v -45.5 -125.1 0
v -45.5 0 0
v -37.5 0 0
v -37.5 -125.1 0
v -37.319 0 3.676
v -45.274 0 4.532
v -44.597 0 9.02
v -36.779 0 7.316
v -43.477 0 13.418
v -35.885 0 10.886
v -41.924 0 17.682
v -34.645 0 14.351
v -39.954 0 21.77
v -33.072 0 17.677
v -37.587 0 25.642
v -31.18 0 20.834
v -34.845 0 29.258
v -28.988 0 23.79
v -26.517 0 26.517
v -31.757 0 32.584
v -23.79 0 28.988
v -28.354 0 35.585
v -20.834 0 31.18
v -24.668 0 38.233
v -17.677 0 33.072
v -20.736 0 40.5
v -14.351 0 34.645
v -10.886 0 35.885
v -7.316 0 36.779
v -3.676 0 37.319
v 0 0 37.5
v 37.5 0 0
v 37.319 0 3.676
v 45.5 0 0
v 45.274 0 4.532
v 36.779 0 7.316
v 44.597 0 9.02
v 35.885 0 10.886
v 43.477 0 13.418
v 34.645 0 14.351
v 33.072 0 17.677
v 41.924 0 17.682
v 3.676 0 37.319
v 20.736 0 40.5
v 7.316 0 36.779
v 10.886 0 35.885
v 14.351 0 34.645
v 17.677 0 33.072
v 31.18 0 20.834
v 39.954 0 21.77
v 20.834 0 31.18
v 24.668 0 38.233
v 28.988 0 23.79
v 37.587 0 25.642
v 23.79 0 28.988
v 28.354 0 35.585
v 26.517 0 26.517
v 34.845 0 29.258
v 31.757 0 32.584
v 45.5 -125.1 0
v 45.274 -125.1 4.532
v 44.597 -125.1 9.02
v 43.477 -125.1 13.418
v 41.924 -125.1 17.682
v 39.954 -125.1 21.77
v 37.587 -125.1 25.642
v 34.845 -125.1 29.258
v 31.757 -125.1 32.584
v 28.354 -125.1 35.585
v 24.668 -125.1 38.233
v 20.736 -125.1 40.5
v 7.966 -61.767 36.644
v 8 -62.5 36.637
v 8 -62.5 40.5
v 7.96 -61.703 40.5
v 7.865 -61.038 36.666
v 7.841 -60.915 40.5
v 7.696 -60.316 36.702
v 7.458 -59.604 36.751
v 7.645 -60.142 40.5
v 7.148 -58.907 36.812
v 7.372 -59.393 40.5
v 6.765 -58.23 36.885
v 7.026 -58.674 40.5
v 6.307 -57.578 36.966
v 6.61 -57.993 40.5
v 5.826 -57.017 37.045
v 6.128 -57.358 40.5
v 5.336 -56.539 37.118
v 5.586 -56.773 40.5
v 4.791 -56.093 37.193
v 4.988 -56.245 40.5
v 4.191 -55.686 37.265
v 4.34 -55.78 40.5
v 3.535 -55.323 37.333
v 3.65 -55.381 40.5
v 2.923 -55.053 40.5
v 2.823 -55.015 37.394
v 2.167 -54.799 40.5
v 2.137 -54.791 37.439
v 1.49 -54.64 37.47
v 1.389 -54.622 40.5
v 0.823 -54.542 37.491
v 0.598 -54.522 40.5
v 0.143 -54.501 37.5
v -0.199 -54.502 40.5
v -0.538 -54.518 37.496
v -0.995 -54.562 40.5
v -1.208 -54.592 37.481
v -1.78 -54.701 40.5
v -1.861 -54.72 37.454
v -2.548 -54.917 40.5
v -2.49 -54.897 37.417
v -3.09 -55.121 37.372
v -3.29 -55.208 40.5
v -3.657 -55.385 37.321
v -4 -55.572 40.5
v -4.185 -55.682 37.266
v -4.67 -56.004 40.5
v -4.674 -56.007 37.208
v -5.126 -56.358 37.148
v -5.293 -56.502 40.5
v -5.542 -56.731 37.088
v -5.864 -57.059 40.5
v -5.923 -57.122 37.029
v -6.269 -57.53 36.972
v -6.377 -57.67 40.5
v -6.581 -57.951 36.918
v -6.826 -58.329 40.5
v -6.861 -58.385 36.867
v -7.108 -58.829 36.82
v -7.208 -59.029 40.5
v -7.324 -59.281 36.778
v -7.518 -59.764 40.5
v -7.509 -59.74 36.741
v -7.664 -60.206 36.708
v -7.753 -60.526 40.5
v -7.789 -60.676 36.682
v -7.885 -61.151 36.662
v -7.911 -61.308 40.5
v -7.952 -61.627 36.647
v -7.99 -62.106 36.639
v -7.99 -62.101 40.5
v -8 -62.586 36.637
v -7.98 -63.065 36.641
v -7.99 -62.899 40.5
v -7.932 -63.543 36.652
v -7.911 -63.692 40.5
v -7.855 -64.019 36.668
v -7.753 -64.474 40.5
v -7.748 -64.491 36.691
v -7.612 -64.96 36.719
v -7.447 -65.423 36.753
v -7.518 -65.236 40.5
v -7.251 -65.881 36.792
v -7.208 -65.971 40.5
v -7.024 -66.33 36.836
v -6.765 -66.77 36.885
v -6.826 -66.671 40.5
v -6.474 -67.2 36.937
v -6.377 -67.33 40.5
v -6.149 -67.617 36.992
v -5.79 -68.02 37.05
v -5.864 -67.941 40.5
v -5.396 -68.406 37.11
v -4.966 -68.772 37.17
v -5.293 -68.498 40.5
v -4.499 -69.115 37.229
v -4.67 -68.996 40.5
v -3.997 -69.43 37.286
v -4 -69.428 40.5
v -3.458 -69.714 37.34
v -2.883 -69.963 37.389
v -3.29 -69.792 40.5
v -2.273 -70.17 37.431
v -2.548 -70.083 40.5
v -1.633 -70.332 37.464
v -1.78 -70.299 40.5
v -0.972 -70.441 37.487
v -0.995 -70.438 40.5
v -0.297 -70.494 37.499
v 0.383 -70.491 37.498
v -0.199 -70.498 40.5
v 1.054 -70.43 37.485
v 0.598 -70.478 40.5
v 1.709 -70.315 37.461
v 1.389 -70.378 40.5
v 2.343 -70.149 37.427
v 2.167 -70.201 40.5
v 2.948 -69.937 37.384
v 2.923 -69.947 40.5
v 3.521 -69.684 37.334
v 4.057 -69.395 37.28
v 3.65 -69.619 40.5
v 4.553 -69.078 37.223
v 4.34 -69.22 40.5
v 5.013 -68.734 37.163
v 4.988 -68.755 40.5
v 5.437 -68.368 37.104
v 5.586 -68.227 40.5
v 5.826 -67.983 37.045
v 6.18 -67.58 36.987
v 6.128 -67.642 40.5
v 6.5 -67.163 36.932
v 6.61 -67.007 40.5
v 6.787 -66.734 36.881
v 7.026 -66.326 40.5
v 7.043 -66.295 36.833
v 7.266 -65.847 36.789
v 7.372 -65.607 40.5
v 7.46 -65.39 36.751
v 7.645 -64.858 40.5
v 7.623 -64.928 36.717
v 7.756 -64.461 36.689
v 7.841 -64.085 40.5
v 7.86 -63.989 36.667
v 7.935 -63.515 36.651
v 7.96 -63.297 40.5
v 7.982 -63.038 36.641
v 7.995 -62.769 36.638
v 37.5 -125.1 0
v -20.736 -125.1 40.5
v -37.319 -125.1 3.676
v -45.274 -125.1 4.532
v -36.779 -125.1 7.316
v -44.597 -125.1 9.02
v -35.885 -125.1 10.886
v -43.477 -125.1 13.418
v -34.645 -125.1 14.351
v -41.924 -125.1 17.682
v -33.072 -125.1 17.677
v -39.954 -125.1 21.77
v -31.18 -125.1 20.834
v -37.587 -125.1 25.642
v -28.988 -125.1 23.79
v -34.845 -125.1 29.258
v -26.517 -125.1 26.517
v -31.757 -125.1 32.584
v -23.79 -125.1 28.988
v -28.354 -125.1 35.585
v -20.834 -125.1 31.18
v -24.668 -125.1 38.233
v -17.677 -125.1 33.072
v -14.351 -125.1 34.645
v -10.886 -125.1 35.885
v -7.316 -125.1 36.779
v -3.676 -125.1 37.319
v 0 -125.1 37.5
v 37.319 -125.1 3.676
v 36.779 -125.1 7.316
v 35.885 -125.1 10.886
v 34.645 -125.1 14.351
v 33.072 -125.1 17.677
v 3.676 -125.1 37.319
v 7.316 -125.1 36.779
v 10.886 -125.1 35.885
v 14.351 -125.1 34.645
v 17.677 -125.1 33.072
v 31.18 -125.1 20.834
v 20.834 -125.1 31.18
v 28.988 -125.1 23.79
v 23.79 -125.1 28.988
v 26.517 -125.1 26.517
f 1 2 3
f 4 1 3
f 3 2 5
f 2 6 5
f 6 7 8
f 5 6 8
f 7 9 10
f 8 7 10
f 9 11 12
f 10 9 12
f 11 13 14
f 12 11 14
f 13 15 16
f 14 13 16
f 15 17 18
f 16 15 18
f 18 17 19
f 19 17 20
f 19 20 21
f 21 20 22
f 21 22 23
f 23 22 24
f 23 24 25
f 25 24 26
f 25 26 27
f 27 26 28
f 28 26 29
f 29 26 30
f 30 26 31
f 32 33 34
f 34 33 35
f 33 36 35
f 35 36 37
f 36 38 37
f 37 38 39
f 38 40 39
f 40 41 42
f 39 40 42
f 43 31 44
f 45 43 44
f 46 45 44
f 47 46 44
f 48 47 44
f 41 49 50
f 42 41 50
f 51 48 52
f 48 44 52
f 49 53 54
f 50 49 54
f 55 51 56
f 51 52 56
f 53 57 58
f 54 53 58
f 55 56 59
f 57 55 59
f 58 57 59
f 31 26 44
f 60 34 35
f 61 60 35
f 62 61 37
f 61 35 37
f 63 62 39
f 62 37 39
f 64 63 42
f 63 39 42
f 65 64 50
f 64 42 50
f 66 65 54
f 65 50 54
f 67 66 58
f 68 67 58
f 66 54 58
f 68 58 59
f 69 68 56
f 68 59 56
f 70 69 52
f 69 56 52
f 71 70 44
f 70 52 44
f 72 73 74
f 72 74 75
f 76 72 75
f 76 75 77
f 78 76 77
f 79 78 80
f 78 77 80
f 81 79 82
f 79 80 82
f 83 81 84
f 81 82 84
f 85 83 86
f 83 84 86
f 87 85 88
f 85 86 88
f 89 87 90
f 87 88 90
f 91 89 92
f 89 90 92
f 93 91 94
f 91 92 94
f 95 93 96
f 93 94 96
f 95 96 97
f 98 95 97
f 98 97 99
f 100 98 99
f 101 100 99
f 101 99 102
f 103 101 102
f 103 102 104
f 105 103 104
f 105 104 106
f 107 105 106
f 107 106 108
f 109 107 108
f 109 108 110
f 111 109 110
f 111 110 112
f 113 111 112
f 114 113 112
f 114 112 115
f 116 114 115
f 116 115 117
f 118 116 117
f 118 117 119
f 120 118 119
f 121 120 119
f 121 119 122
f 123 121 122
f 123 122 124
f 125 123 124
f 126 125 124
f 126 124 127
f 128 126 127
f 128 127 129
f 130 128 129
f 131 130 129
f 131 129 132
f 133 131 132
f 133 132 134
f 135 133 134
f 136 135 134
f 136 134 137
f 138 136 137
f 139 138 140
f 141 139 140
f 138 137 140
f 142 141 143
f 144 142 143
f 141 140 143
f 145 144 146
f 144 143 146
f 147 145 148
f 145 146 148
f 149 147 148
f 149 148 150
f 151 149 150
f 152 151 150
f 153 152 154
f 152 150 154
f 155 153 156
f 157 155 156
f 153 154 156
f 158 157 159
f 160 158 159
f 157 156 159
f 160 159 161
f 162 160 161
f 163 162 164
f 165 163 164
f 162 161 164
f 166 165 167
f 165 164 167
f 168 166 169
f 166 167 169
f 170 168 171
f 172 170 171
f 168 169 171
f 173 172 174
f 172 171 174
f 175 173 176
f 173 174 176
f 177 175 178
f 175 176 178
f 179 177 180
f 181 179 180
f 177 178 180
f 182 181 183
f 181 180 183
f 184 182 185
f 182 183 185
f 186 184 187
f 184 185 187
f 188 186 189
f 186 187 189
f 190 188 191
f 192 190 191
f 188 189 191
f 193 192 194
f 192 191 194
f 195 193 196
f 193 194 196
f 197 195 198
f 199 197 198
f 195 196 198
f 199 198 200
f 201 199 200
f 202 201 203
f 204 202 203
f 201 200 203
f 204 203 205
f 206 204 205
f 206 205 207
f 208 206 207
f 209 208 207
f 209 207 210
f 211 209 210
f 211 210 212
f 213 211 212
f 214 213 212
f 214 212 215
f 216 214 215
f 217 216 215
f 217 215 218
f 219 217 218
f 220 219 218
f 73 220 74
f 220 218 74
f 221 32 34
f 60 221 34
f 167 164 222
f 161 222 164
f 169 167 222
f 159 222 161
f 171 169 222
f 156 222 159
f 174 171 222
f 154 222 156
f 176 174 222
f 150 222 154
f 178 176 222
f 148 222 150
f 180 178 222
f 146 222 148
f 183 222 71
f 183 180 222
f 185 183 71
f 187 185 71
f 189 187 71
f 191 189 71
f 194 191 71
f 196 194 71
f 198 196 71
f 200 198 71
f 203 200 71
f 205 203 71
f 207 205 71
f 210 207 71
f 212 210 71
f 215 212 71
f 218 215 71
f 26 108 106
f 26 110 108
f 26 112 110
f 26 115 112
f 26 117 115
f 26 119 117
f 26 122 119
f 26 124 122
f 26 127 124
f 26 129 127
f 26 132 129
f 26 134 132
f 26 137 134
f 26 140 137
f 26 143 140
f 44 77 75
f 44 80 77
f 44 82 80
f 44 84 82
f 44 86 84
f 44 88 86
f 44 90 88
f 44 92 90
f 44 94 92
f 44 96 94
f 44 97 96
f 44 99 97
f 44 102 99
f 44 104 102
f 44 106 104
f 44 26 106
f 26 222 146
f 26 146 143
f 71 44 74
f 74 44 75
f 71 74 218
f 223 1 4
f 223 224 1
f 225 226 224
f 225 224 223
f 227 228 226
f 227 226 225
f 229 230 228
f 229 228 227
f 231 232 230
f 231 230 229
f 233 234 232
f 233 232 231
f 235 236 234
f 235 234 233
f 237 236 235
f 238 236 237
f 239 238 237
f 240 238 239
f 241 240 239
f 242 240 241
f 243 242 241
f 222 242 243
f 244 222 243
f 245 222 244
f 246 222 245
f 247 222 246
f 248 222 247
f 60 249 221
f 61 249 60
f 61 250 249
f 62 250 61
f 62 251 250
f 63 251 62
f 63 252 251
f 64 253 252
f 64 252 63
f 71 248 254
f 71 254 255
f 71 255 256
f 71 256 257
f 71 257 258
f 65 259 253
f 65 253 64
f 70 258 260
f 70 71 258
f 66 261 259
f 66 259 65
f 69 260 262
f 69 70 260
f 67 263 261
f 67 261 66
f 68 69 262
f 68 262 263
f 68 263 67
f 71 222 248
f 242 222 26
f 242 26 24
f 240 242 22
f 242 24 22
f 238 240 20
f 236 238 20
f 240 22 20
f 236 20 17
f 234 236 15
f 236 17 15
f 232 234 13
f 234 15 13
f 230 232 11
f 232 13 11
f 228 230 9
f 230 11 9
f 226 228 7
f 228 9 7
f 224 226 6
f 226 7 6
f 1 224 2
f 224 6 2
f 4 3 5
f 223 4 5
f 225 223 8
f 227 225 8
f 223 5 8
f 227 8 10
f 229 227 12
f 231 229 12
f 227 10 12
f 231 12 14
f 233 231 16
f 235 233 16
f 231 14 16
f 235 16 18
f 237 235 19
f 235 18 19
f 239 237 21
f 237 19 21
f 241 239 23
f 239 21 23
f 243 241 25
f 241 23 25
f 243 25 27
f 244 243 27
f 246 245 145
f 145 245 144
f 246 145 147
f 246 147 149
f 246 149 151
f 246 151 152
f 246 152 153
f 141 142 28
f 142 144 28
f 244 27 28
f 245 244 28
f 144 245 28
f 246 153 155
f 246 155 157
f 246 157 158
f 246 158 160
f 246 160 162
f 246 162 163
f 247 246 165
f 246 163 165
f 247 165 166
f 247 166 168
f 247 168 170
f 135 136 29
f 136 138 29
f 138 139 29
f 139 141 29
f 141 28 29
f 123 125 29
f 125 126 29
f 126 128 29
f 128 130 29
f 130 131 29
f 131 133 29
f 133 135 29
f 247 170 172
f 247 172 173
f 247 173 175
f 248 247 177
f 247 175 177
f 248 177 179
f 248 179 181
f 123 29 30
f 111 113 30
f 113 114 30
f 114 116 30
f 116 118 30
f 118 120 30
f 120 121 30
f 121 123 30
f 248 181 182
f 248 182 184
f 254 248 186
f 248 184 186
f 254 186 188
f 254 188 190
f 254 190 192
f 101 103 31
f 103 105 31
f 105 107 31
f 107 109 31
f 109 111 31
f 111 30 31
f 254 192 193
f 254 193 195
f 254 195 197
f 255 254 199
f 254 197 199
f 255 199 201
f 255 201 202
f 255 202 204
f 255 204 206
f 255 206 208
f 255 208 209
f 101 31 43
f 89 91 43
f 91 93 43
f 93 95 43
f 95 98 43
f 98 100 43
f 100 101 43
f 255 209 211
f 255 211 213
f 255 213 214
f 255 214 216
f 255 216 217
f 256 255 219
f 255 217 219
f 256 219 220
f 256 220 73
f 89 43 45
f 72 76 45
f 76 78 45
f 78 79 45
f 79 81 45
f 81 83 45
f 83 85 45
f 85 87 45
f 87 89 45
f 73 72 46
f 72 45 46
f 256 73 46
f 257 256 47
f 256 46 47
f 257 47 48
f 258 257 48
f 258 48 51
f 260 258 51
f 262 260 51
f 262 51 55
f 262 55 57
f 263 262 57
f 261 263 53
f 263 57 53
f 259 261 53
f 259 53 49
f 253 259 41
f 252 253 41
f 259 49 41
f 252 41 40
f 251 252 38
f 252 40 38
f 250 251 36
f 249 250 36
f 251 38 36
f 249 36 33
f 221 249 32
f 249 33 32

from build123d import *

# Parameters (mm, degrees)
F1_DEPTH = 125.1
F2_W     = 44
F2_H     = 8.367
F3_DEPTH = 125.1
F4_R     = 8
F5_DEPTH = 4


with BuildPart() as f1:
    # F0 (on Front) → F1 (new body)
    with BuildSketch(Plane.XZ):
        with BuildLine():
            ThreePointArc((-37.5, 0), (0, 37.5), (37.5, 0))
            Line((37.5, 0), (45.5, 0))
            ThreePointArc((45.5, 0), (0, 45.5), (-45.5, 0))
            Line((-45.5, 0), (-37.5, 0))
        make_face()
    extrude(amount=F1_DEPTH)

    # F2 (on Front) → F3 (cut)
    with BuildSketch(Plane.XZ):
        with Locations((0, 44.6835)):
            Rectangle(F2_W, F2_H)
    extrude(amount=F3_DEPTH, mode=Mode.SUBTRACT)

    # F4 (on face) → F5 (cut)
    with BuildSketch(Plane.XY.offset(40.5)):
        with Locations((0, -62.5)):
            Circle(F4_R)
    extrude(amount=-F5_DEPTH, mode=Mode.SUBTRACT)


solid = f1.part
